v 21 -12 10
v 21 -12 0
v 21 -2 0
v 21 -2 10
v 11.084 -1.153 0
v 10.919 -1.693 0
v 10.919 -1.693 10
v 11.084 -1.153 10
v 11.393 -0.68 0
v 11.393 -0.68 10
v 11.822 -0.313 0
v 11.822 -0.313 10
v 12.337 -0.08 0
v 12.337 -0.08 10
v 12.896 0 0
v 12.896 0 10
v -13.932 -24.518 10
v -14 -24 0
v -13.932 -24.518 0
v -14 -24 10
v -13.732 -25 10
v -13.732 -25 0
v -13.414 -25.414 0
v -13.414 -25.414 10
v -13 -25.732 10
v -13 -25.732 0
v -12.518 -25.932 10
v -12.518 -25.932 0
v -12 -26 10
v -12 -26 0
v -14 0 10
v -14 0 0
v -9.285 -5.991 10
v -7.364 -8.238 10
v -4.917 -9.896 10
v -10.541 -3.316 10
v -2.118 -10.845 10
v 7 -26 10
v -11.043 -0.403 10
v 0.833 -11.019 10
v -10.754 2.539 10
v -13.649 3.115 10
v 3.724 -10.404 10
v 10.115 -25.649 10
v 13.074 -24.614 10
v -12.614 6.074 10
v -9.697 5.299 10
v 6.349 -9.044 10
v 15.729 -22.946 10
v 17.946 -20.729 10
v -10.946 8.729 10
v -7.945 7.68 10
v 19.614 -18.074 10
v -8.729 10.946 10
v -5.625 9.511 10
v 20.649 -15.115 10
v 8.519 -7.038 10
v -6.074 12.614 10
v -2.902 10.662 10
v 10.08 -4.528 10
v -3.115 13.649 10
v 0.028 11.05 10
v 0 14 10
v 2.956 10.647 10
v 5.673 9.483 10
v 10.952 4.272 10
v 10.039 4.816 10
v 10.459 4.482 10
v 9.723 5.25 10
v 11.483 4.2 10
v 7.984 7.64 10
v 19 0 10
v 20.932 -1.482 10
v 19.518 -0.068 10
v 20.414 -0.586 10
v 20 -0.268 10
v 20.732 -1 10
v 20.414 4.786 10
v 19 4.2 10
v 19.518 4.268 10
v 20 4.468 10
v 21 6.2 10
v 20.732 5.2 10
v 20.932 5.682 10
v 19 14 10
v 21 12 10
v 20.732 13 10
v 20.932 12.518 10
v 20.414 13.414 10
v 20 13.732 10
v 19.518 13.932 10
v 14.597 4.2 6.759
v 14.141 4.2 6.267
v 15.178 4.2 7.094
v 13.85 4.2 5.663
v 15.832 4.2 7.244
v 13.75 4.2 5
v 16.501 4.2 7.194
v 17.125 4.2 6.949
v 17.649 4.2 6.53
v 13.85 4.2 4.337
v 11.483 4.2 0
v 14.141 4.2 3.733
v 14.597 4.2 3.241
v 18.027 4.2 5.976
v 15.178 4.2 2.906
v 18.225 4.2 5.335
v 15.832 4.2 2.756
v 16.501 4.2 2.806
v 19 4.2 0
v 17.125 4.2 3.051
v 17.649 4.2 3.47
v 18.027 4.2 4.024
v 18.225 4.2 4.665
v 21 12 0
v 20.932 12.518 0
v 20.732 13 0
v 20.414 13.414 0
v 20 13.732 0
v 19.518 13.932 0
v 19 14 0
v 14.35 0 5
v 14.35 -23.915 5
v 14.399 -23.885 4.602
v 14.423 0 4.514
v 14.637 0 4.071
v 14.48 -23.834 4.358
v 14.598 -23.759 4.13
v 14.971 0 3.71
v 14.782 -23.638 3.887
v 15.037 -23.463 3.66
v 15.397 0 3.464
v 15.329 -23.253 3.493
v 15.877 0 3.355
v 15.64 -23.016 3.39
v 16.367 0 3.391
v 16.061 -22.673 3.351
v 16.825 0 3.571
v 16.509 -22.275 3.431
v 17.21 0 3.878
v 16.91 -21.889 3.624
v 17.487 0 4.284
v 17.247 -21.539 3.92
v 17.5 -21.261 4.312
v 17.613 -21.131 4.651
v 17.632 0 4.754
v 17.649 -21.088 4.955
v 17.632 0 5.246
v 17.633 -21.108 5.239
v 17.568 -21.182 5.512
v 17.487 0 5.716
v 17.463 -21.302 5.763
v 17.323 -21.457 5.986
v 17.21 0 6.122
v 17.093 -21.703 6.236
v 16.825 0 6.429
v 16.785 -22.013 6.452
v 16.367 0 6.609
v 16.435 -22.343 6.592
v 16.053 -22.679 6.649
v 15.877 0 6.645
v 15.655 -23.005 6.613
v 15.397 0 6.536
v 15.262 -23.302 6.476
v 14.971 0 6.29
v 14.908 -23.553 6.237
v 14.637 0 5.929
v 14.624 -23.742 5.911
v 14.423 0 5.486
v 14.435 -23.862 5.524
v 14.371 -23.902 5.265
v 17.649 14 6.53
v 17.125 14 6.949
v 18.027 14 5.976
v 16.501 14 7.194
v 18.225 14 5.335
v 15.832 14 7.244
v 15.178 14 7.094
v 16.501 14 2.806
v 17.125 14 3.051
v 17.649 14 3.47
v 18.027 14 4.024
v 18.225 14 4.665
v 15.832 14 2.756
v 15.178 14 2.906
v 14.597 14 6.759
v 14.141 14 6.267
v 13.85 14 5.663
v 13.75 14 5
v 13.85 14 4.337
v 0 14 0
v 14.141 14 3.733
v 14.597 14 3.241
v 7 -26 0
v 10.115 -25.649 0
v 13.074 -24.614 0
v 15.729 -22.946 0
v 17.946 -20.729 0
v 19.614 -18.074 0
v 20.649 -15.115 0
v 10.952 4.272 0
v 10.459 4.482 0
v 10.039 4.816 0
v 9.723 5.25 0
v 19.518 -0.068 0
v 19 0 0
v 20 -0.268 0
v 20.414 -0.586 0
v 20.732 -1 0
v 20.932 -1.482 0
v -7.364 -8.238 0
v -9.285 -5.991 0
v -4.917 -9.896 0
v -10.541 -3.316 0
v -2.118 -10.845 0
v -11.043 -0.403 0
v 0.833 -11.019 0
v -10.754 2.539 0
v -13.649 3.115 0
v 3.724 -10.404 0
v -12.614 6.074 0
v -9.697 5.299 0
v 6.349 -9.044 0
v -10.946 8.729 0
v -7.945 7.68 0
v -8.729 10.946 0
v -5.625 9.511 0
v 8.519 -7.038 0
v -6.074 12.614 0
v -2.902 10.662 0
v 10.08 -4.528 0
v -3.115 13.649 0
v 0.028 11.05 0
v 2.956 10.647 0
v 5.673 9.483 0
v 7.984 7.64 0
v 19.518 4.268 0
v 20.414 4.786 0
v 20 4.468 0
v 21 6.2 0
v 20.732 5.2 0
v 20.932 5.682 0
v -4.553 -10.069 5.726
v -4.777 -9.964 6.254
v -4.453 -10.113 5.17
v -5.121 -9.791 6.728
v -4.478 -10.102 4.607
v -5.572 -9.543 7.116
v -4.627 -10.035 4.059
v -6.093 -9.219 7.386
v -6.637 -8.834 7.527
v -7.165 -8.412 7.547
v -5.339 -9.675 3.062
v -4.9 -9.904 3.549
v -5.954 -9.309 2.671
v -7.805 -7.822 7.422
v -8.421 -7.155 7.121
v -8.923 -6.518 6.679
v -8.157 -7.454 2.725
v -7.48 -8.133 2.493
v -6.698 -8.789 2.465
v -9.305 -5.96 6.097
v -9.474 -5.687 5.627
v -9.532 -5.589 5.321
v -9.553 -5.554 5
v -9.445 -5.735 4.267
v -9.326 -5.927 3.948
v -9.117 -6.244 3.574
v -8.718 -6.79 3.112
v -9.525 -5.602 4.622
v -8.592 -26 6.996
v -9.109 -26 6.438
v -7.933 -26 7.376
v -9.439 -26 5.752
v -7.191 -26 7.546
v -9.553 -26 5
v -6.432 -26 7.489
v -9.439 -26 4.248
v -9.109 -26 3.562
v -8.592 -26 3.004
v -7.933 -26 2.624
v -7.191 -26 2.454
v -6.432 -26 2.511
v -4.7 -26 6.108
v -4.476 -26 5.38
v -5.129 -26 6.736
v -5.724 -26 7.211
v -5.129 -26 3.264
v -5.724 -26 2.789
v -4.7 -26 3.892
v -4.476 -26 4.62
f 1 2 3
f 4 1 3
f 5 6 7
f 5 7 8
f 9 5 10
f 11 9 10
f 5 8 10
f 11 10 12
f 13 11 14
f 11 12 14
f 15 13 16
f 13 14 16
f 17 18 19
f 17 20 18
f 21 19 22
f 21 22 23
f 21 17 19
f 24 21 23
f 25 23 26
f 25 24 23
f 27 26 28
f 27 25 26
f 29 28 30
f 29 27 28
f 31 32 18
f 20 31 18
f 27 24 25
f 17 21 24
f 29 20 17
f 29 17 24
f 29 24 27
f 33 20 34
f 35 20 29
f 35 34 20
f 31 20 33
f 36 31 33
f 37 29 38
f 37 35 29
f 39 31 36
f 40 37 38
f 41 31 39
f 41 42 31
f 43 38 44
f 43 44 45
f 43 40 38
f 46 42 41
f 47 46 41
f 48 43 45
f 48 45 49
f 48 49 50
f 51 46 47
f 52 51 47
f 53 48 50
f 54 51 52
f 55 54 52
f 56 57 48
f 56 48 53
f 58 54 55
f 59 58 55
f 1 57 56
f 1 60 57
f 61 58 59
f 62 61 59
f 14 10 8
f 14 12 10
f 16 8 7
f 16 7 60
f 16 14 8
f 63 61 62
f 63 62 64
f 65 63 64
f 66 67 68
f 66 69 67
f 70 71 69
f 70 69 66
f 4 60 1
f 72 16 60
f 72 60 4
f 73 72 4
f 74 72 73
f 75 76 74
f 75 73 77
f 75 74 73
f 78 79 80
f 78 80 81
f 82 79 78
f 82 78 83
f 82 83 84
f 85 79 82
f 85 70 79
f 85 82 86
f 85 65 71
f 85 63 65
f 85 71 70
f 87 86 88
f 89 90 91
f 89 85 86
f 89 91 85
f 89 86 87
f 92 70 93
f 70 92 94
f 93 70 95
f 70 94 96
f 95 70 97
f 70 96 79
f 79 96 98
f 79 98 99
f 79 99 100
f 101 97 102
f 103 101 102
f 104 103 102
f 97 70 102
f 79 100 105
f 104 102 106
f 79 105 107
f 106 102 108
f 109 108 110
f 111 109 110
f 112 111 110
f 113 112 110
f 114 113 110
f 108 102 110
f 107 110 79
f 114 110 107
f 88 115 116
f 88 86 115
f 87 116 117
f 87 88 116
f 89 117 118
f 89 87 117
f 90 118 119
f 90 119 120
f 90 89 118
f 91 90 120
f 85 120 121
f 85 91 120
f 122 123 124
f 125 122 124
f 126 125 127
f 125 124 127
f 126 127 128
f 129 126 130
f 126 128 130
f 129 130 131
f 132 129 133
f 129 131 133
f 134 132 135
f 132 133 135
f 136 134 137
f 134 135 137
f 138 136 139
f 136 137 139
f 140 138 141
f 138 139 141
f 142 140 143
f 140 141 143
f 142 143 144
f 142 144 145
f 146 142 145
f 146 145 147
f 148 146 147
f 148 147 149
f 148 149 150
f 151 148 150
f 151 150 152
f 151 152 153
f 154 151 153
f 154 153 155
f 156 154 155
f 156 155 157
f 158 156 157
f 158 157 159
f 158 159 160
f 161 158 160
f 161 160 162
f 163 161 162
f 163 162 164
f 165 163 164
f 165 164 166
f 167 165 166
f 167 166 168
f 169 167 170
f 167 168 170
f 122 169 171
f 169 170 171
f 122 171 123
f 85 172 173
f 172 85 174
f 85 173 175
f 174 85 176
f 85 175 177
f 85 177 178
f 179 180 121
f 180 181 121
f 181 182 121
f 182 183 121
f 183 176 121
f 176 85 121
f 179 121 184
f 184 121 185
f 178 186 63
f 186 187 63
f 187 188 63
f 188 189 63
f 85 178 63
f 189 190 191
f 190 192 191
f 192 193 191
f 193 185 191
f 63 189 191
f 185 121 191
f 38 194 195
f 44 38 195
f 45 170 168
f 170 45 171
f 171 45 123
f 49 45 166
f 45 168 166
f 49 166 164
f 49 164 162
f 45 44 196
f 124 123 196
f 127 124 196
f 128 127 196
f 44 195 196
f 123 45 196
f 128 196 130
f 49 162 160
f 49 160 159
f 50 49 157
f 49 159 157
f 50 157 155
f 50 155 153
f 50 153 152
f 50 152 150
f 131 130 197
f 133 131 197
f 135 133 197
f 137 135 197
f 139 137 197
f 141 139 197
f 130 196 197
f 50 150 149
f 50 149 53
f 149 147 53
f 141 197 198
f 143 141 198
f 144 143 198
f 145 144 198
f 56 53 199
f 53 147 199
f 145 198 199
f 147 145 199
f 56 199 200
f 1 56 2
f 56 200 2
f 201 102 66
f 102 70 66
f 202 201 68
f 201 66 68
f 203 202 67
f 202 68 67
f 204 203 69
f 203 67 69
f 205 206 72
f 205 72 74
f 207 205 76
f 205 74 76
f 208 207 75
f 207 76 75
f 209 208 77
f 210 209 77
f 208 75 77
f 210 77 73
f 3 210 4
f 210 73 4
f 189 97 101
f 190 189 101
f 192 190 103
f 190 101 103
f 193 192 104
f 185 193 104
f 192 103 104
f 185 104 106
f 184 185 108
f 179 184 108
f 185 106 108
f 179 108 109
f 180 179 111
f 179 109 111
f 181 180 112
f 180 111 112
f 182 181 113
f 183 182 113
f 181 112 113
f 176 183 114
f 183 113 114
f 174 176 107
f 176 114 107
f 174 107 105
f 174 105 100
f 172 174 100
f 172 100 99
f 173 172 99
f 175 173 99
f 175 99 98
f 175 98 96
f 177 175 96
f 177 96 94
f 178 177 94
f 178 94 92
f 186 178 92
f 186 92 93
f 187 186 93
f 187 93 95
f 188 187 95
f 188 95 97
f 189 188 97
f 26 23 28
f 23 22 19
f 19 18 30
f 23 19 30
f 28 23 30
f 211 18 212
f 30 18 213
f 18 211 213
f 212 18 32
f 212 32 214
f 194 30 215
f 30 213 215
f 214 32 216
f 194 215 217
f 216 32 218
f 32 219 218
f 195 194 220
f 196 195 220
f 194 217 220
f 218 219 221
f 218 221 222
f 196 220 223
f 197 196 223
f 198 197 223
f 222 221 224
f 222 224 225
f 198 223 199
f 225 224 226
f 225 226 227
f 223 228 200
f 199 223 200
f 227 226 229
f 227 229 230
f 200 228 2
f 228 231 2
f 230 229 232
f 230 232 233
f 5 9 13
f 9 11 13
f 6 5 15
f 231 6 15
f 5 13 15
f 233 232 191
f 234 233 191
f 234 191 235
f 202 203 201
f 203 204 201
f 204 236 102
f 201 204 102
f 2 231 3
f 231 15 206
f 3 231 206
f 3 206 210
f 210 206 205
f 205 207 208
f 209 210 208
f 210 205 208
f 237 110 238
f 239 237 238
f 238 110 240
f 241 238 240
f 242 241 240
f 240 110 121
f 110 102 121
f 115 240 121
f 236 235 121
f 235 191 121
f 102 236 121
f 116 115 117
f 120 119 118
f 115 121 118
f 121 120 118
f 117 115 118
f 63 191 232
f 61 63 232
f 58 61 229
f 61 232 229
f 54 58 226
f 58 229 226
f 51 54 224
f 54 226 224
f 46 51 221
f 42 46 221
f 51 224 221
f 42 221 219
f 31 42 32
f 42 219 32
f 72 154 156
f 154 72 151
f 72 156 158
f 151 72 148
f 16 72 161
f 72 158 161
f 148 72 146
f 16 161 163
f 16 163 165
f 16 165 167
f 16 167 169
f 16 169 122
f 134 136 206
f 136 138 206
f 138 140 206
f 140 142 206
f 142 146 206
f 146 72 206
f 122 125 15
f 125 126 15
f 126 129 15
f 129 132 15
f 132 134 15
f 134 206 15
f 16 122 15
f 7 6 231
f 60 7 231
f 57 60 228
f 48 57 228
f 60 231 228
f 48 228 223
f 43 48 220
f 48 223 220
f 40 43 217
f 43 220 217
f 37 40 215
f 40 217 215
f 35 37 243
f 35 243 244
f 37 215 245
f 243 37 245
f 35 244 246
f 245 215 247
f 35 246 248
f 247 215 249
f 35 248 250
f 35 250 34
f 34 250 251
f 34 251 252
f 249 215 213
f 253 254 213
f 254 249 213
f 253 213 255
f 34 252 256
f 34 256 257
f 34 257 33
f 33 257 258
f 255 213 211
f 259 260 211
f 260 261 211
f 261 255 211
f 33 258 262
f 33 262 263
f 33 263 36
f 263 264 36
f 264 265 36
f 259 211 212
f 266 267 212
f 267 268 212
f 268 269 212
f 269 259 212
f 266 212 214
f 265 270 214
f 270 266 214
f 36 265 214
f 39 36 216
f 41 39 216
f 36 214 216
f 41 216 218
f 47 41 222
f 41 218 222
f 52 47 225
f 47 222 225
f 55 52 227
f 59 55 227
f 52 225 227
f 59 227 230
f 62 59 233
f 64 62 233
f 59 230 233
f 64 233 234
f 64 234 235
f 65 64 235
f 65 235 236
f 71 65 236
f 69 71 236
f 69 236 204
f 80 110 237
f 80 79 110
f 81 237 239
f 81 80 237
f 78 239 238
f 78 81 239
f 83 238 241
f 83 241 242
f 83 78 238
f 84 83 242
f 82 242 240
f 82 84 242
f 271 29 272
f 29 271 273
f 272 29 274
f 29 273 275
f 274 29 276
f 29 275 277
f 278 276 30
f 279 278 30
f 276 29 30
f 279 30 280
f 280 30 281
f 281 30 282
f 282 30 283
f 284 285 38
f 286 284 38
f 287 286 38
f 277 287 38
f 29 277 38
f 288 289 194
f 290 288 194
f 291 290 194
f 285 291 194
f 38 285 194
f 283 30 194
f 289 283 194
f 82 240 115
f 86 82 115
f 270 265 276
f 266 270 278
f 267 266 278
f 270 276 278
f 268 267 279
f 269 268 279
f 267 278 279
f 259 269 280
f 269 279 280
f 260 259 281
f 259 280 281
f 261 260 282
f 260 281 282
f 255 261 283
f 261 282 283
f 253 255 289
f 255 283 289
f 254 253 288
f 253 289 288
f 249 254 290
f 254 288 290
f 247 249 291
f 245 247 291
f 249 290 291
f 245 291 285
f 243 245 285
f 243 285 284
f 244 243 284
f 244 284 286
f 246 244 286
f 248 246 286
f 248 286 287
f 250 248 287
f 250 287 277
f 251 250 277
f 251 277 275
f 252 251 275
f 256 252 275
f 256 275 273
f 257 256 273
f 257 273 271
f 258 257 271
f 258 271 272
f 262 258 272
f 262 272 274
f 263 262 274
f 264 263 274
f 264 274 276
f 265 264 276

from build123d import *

# Parameters (mm, degrees)
EXTRUDE_1_DEPTH            = 10
HOLE_WIZARD_M41_D          = 4.5
HOLE_WIZARD_M41_DEPTH      = 9.8
M4X0_71_D                  = 3.3
HOLE_WIZARD_1_4_201_REACH  = 48.271
HOLE_WIZARD_1_4_201_BORE_R = 2.5527
FILLET_1_R                 = 2


with BuildPart() as part:
    # Эскиз1 → Бобышка-Вытянуть1 (new body)
    with BuildSketch(Plane.XY):
        with BuildLine():
            Line((10.220689801, 4.2), (21, 4.2))
            Line((21, 4.2), (21, 14))
            Line((21, 14), (0, 14))
            ThreePointArc((0, 14), (-9.899494937, 9.899494937), (-14, 0))
            Line((-14, 0), (-14, -26))
            Line((-14, -26), (7, -26))
            ThreePointArc((7, -26), (16.899494937, -21.899494937), (21, -12))
            Line((21, -12), (21, 0))
            Line((21, 0), (11.05, 0))
            ThreePointArc((11.05, 0), (-10.840690068, -2.140546391), (10.220689801, 4.2))
        make_face()
    extrude(amount=EXTRUDE_1_DEPTH)

    # Отверстие с зазором M41
    with Locations(Plane(origin=(0, 14, 0), x_dir=(1, 0, 0), z_dir=(0, 1, 0))):
        with Locations((16, -5)):
            Hole(HOLE_WIZARD_M41_D / 2, depth=HOLE_WIZARD_M41_DEPTH)

    # Отверстие обработанное метчиком M4x0.71 (through all)
    with Locations(Plane(origin=(0, 0, 0), x_dir=(1, 0, 0), z_dir=(0, 1, 0))):
        with Locations((16, -5)):
            Hole(M4X0_71_D / 2)

    # Отверстие обработанное метчиком 1/4-201 bore → Отверстие обработанное метчиком 1/4-201 (cut, up to next)
    with BuildSketch(Plane(origin=(0, -26, 0), x_dir=(-1, 0, 0), z_dir=(0, -1, 0)), mode=Mode.PRIVATE) as hole_wizard_1_4_201_sk1:
        with Locations((7, -5)):
            Circle(HOLE_WIZARD_1_4_201_BORE_R)
    hole_wizard_1_4_201_tool1 = extrude(hole_wizard_1_4_201_sk1.sketch, amount=-HOLE_WIZARD_1_4_201_REACH, mode=Mode.PRIVATE) & part.part
    add(hole_wizard_1_4_201_tool1.solids().sort_by_distance((-7, -26, 5))[0], mode=Mode.SUBTRACT)

    # Скругление1
    fillet_1_edges = [part.edges().sort_by_distance(p)[0] for p in [
        (11.05, 0, 5),
        (21, 0, 5),
        (-14, -26, 5),
        (21, 14, 5),
        (21, 4.2, 5),
        (10.220689801, 4.2, 5),
    ]]
    fillet(fillet_1_edges, radius=FILLET_1_R)


solid = part.part
